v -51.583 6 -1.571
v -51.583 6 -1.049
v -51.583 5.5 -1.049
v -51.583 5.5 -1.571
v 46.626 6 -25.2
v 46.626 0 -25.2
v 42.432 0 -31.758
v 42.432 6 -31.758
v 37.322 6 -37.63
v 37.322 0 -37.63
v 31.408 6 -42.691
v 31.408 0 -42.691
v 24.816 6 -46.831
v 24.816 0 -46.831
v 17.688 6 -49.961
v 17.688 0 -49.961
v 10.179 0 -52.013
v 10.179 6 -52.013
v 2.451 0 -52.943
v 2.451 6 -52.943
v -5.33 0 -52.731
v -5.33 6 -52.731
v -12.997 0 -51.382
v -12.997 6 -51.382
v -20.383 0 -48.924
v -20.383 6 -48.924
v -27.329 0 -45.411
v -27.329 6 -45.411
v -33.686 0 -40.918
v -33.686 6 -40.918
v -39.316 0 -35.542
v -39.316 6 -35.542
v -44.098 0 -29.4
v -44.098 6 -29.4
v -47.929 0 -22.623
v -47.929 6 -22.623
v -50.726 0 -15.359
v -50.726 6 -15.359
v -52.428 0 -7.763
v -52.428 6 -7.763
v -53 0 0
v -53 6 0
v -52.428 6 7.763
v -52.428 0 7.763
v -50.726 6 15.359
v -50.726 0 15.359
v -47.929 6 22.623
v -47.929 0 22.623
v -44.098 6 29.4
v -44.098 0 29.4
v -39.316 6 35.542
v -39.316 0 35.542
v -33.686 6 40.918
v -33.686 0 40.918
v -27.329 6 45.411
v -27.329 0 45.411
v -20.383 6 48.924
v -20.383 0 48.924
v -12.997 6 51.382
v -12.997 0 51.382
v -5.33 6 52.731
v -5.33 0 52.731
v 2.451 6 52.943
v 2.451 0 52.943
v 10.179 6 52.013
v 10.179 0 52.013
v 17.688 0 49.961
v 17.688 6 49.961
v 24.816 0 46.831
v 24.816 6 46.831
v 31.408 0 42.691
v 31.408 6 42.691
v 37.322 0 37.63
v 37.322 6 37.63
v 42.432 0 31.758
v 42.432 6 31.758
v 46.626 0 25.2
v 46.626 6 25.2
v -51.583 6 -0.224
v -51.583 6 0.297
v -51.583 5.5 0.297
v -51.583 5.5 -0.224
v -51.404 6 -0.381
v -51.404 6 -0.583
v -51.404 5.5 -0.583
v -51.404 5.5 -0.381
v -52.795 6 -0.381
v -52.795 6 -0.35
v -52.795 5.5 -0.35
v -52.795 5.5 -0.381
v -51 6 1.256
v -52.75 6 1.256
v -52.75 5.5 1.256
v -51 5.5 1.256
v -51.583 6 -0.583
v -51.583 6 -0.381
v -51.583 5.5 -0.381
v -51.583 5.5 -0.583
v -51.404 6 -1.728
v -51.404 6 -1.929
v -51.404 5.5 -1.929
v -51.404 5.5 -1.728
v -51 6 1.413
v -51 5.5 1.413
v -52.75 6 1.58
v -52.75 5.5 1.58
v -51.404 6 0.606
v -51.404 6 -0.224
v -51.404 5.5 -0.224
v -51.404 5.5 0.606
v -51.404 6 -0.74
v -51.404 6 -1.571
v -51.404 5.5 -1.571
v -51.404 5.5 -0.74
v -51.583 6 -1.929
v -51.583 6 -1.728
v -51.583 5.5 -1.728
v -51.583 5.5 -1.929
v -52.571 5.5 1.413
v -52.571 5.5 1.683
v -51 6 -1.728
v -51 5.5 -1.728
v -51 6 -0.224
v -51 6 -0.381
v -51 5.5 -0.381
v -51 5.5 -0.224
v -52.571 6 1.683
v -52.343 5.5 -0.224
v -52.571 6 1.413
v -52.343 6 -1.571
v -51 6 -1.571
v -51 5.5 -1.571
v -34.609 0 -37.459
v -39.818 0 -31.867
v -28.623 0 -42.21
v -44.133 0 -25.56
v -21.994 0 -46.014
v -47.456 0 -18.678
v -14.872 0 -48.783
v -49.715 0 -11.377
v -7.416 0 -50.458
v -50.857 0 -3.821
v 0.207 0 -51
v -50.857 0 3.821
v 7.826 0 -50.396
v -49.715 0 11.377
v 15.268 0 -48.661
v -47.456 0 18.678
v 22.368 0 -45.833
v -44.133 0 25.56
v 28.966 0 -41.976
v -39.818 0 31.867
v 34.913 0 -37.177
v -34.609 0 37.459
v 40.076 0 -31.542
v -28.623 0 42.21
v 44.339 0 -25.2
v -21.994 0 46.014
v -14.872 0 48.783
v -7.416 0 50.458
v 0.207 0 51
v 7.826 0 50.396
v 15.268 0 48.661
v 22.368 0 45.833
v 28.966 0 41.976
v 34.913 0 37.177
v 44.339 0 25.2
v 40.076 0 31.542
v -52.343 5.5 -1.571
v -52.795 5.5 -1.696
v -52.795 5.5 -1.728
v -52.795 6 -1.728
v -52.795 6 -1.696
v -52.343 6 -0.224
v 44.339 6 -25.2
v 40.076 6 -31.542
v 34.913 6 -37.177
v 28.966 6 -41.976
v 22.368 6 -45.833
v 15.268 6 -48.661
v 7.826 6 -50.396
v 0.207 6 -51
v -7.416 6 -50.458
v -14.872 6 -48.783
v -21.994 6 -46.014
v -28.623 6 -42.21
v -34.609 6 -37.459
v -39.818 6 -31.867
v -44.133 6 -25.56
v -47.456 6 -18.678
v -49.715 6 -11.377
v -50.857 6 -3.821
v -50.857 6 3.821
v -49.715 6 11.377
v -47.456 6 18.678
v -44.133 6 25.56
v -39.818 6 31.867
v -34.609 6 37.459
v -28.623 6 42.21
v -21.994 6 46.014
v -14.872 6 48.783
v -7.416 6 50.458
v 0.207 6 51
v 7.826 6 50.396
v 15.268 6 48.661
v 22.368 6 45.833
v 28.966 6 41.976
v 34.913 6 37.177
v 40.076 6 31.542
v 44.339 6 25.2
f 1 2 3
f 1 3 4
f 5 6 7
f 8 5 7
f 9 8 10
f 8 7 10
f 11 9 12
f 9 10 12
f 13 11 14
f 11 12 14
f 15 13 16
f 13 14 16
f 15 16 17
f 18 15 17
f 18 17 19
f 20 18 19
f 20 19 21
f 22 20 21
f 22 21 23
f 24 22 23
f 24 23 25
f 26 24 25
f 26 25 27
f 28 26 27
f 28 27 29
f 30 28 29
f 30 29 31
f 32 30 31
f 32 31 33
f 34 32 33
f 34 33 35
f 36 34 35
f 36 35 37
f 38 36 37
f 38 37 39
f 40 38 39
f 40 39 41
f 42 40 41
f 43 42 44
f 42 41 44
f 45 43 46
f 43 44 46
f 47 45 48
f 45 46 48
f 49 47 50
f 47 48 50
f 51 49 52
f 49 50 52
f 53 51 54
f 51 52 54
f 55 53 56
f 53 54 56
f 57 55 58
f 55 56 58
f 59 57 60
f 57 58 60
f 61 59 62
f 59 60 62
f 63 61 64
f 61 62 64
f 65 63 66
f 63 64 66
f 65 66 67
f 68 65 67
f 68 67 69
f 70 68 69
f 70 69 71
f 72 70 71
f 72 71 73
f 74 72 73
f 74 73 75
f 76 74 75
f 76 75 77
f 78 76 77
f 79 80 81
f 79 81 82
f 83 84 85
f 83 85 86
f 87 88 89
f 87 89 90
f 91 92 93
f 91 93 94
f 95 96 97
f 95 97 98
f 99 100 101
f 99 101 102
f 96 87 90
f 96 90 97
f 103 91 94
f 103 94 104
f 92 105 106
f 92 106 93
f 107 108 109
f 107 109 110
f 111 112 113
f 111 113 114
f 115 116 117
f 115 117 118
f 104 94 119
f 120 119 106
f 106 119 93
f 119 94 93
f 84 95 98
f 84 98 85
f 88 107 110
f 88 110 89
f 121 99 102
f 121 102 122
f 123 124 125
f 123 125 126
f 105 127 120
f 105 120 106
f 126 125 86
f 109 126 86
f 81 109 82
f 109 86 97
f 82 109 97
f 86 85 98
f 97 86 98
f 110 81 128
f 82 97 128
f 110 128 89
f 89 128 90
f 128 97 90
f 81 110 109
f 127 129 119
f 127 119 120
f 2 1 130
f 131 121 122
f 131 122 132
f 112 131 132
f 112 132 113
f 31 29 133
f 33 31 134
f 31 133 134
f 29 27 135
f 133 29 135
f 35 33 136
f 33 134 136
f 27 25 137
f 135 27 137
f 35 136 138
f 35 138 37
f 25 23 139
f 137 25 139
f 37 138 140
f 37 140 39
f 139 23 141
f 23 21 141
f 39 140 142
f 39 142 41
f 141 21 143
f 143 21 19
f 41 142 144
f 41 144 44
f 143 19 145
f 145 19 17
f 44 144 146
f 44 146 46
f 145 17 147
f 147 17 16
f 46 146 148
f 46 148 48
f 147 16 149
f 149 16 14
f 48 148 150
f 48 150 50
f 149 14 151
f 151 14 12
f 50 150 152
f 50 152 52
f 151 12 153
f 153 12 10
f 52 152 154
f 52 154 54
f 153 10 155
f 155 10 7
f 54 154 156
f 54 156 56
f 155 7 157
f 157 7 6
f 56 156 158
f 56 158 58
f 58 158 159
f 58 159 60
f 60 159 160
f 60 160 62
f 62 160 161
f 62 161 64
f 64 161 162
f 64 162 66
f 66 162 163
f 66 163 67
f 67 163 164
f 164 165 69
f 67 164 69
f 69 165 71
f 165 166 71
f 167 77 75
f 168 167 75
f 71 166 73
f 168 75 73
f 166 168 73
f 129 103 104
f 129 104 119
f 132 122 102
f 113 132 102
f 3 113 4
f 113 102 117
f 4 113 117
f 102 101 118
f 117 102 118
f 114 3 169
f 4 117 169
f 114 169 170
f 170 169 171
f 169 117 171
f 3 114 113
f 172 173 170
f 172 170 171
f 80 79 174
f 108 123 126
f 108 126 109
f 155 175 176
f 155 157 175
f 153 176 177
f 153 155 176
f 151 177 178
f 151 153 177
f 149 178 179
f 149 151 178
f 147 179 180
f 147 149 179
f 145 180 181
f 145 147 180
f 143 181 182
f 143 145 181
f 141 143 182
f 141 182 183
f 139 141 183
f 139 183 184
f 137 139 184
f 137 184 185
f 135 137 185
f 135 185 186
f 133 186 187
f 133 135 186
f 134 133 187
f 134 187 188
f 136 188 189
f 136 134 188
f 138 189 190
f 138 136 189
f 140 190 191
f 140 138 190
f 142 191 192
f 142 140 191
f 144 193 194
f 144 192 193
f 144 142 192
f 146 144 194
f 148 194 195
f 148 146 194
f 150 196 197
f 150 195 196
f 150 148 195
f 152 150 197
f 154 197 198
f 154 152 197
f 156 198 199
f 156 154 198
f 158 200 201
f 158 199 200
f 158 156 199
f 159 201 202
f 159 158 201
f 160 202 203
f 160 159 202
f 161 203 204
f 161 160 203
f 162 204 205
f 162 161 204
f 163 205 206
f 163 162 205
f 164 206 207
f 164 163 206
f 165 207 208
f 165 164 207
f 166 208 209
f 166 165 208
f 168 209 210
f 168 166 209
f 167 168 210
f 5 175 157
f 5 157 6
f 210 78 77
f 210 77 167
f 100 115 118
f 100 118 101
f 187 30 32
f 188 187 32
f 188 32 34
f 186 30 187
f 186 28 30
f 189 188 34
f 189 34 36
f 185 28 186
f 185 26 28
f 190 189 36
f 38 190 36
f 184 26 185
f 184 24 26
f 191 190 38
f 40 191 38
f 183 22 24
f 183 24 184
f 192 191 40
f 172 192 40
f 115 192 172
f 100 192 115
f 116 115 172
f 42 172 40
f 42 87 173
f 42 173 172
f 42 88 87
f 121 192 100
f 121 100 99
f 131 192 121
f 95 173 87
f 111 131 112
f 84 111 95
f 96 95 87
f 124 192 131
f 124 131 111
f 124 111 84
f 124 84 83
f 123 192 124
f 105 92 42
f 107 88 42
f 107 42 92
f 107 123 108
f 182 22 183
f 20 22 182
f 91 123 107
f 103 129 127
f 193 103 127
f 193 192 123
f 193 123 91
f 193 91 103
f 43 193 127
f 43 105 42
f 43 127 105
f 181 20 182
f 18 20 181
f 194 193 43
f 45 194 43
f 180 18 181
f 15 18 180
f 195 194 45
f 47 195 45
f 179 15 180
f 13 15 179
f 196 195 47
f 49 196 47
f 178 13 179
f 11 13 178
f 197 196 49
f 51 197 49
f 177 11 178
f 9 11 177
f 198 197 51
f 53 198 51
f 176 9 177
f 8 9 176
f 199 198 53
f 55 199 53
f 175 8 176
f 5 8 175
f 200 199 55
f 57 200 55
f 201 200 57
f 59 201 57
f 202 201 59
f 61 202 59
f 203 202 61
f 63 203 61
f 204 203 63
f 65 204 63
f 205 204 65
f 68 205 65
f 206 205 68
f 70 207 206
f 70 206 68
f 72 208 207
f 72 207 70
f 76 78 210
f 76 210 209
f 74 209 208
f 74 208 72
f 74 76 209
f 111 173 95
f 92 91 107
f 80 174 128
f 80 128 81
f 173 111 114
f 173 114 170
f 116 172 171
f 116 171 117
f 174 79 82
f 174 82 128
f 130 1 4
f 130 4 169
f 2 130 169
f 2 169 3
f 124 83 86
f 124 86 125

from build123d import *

# Parameters (mm, degrees)
SKETCH1_R           = 53
SKETCH1_R_2         = 51
BOSS_EXTRUDE2_DEPTH = 6
CUT_EXTRUDE1_DEPTH  = 10
CUT_EXTRUDE2_DEPTH  = 0.5


with BuildPart() as part:
    # Sketch1 → Boss-Extrude2 (new body)
    with BuildSketch(Plane(origin=(0, 0, 0), x_dir=(1, 0, 0), z_dir=(0, 1, 0))):
        with Locations(Location((0, 0, 0), (0, 0, 270))):
            Circle(SKETCH1_R)
        with Locations(Location((0, 0, 0), (0, 0, 270))):
            Circle(SKETCH1_R_2, mode=Mode.SUBTRACT)
    extrude(amount=BOSS_EXTRUDE2_DEPTH)

    # Sketch2 → Cut-Extrude1 (cut)
    with BuildSketch(Plane(origin=(0, 6, 0), x_dir=(1, 0, 0), z_dir=(0, 1, 0))):
        Polygon((0, 0), (0, 25.2), (76.826427625, 25.2), (76.826427625, -25.2), (0, -25.2), align=None)
    extrude(amount=-CUT_EXTRUDE1_DEPTH, mode=Mode.SUBTRACT)

    # Sketch3 → Cut-Extrude2 (cut)
    # profile 1 of 3: a face of its own
    with BuildSketch(Plane(origin=(0, 6, 0), x_dir=(1, 0, 0), z_dir=(0, 1, 0))):
        Polygon((-52.794871795, 1.695663061), (-52.794871795, 1.727564103), (-51.583333333, 1.727564103), (-51.583333333, 1.929487179), (-51.403846154, 1.929487179), (-51.403846154, 1.727564103), (-51, 1.727564103), (-51, 1.570512821), (-51.403846154, 1.570512821), (-51.403846154, 0.740384615), align=None)
        Polygon((-51.583333333, 1.570512821), (-52.343349359, 1.570512821), (-51.583333333, 1.048878205), align=None, mode=Mode.SUBTRACT)
    # profile 2 of 3: a face of its own
    with BuildSketch(Plane(origin=(0, 6, 0), x_dir=(1, 0, 0), z_dir=(0, 1, 0))):
        Polygon((-52.794871795, 0.349509215), (-52.794871795, 0.381410256), (-51.583333333, 0.381410256), (-51.583333333, 0.583333333), (-51.403846154, 0.583333333), (-51.403846154, 0.381410256), (-51, 0.381410256), (-51, 0.224358974), (-51.403846154, 0.224358974), (-51.403846154, -0.605769231), align=None)
        Polygon((-51.583333333, 0.224358974), (-52.343349359, 0.224358974), (-51.583333333, -0.297275641), align=None, mode=Mode.SUBTRACT)
    # profile 3 of 3: a face of its own
    with BuildSketch(Plane(origin=(0, 6, 0), x_dir=(1, 0, 0), z_dir=(0, 1, 0))):
        Polygon((-52.75, -1.579977965), (-52.75, -1.256410256), (-51, -1.256410256), (-51, -1.413461538), (-52.570512821, -1.413461538), (-52.570512821, -1.682692308), align=None)
    extrude(amount=-CUT_EXTRUDE2_DEPTH, mode=Mode.SUBTRACT)


solid = part.part
